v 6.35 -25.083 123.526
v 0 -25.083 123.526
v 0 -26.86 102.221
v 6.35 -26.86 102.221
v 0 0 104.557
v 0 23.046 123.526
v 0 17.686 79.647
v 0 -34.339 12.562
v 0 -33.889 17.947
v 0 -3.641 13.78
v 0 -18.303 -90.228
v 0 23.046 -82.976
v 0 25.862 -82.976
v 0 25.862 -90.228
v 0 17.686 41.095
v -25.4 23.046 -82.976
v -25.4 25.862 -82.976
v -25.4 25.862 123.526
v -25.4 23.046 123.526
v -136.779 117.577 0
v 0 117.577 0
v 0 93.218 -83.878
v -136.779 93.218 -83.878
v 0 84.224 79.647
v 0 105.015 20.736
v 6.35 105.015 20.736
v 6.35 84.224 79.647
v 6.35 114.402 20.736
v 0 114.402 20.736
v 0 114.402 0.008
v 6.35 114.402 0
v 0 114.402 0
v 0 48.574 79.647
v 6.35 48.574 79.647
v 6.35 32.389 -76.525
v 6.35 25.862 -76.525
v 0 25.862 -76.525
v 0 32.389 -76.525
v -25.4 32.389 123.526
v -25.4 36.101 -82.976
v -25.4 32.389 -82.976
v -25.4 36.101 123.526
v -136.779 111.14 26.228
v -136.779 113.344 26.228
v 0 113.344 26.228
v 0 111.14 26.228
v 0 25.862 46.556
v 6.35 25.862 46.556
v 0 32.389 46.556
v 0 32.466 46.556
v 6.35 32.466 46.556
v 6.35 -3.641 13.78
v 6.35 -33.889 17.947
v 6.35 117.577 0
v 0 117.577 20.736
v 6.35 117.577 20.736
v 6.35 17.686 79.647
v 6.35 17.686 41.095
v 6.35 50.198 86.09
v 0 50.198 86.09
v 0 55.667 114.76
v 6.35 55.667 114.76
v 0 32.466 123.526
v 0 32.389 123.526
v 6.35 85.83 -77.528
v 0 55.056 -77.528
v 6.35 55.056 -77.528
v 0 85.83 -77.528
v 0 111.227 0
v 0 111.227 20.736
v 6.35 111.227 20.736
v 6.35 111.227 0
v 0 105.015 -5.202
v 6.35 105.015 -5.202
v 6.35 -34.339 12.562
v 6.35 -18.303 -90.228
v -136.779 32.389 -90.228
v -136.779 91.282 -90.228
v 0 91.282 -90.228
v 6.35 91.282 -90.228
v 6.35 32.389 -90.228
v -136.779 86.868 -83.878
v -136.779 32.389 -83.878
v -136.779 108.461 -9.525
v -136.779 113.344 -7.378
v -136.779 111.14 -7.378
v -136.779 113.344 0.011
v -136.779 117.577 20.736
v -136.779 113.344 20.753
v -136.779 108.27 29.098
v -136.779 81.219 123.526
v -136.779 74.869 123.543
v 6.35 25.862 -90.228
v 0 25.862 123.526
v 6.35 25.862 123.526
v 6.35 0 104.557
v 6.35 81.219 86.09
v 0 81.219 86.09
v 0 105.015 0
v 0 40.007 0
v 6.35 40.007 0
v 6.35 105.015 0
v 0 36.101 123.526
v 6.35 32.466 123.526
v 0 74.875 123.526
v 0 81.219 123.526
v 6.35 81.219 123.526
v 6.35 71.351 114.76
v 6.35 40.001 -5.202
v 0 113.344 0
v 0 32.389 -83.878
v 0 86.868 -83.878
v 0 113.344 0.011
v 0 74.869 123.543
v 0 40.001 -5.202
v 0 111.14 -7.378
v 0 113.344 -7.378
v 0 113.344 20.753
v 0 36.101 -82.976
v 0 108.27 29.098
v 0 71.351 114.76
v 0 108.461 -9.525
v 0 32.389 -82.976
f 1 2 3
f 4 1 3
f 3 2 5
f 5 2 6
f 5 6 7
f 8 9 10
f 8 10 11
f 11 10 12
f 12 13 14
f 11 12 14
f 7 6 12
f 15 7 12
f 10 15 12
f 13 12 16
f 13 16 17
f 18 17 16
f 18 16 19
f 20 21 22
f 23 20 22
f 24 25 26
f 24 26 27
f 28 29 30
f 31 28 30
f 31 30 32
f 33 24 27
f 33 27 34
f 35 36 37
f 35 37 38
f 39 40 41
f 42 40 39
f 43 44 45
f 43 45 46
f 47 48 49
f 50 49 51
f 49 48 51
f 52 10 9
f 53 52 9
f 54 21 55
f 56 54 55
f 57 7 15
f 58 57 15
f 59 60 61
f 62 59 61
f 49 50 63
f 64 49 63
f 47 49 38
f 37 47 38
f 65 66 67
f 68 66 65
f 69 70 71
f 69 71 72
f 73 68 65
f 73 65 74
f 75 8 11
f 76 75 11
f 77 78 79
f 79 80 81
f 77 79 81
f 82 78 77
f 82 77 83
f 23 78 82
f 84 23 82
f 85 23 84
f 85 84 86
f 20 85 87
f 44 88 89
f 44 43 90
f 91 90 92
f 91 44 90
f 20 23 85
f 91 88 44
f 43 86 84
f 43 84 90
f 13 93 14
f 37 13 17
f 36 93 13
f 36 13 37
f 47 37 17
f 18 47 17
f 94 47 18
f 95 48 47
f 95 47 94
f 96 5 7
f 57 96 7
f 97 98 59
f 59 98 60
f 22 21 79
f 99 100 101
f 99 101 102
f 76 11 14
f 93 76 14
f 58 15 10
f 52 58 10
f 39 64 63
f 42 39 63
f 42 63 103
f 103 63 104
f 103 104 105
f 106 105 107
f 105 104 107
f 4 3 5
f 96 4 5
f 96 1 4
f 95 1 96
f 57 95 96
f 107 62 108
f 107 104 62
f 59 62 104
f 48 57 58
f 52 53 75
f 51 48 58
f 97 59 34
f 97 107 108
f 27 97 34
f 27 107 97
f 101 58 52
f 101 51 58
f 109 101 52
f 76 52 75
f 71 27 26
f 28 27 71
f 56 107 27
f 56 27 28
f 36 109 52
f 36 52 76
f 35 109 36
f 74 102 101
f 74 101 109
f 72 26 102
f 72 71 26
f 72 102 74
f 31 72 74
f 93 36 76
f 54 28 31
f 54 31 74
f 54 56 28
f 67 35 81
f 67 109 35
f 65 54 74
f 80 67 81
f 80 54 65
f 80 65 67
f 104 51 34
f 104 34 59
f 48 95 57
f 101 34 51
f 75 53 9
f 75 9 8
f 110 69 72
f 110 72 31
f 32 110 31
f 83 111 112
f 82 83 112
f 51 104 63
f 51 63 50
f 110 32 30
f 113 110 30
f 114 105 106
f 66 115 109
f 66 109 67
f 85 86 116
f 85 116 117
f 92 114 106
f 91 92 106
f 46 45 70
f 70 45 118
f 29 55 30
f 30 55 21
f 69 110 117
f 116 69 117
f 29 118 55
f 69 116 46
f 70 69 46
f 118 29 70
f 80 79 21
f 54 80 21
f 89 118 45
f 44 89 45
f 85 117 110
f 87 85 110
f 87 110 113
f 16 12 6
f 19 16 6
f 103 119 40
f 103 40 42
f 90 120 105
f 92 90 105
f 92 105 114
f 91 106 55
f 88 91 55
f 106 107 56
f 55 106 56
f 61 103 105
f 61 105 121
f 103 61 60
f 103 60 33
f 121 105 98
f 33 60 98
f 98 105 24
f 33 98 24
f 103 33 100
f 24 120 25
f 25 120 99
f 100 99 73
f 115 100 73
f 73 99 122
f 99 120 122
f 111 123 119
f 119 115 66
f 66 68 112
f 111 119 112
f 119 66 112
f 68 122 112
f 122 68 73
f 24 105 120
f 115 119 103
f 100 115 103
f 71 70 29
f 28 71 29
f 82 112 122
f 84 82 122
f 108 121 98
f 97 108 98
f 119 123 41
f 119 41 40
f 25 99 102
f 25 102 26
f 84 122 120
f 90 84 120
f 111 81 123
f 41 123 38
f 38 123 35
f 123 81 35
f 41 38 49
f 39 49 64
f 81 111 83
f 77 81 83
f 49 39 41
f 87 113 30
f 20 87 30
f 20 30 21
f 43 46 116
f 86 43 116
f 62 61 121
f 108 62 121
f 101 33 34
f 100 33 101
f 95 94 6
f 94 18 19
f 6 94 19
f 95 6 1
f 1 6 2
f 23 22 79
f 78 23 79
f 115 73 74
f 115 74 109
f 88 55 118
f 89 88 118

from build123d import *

# Parameters (mm, degrees)
SKETCH1_W           = 20.735936364
SKETCH1_H           = 3.175
BOSS_EXTRUDE1_DEPTH = 6.35
SKETCH2_W           = 82.651107169
SKETCH2_H           = 6.52720724
SKETCH2_W_2         = 76.969823319
SKETCH2_H_2         = 6.604
CUT_EXTRUDE1_DEPTH  = 7.35
SKETCH6_W           = 206.502
SKETCH6_H           = 3.711703494
SKETCH6_H_2         = 2.816288331
BOSS_EXTRUDE3_DEPTH = 25.4
BOSS_EXTRUDE5_DEPTH = 136.779


with BuildPart() as part:
    # Sketch1 → Boss-Extrude1 (new body)
    with BuildSketch(Plane(origin=(0, 0, 0), x_dir=(0, 0, -1), z_dir=(1, 0, 0))):
        Polygon((-123.525645009, 81.218983384), (-123.525645009, -25.082949612), (-102.22101814, -26.860004783), (-104.557017494, 0), (-79.646789796, 17.686261666), (-41.094549164, 17.686261666), (-13.779824281, -3.641289166), (-17.947471695, -33.889404663), (-12.561862574, -34.338627482), (90.228248196, -18.303088648), (90.228248196, 91.281577209), (0, 117.577378193), (-20.735936364, 117.577378193), align=None)
        Polygon((5.201841666, 40.001048477), (77.528248196, 55.056292197), (77.528248196, 85.830387495), (5.201841666, 105.015188817), align=None, mode=Mode.SUBTRACT)
        Polygon((-79.646789796, 84.224142025), (-79.646789796, 48.574048336), (0, 40.007327233), (0, 105.015188817), (-20.735936364, 105.015188817), align=None, mode=Mode.SUBTRACT)
        Polygon((-86.090479579, 81.218983384), (-86.090479579, 50.197772081), (-114.759972161, 55.666680192), (-114.759972161, 71.350976637), align=None, mode=Mode.SUBTRACT)
        with Locations((-10.367968182, 112.814878193)):
            Rectangle(SKETCH1_W, SKETCH1_H, mode=Mode.SUBTRACT)
    extrude(amount=BOSS_EXTRUDE1_DEPTH)

    # Sketch2 → Cut-Extrude1 (cut, through all)
    with BuildSketch(Plane(origin=(6.35, 0, 0), x_dir=(0, 0, -1), z_dir=(1, 0, 0))):
        with Locations((117.850801407, 29.125465717)):
            Rectangle(SKETCH2_W, SKETCH2_H)
        with Locations((-85.04073335, 29.163862097)):
            Rectangle(SKETCH2_W_2, SKETCH2_H_2)
    extrude(amount=-CUT_EXTRUDE1_DEPTH, mode=Mode.SUBTRACT)

    # Sketch6 → Boss-Extrude3 (add)
    with BuildSketch(Plane.ZY):
        with Locations((20.274645009, 34.244921084)):
            Rectangle(SKETCH6_W, SKETCH6_H)
        with Locations((20.274645009, 24.453717932)):
            Rectangle(SKETCH6_W, SKETCH6_H_2)
    extrude(amount=BOSS_EXTRUDE3_DEPTH)

    # Sketch8 → Boss-Extrude5 (add)
    with BuildSketch(Plane.ZY):
        Polygon((0, 117.577378193), (-83.878248196, 93.218298083), (-90.228248196, 91.281577209), (-90.228248196, 32.389069337), (-83.878248196, 32.389069337), (-83.878248196, 86.868298083), (-9.525197863, 108.461165703), (29.097772116, 108.270149457), (123.542635704, 74.868983384), (123.525645009, 81.218983384), (20.735936364, 117.577378193), (20.752927059, 113.344232588), (26.228286967, 113.344232588), (26.228286967, 111.139694939), (20.752927059, 111.139694939), (0.016990695, 111.139694939), (-7.377605414, 111.139694939), (-7.377605414, 113.344232588), (0.011172356, 113.344232588), align=None)
    extrude(amount=BOSS_EXTRUDE5_DEPTH)


solid = part.part
